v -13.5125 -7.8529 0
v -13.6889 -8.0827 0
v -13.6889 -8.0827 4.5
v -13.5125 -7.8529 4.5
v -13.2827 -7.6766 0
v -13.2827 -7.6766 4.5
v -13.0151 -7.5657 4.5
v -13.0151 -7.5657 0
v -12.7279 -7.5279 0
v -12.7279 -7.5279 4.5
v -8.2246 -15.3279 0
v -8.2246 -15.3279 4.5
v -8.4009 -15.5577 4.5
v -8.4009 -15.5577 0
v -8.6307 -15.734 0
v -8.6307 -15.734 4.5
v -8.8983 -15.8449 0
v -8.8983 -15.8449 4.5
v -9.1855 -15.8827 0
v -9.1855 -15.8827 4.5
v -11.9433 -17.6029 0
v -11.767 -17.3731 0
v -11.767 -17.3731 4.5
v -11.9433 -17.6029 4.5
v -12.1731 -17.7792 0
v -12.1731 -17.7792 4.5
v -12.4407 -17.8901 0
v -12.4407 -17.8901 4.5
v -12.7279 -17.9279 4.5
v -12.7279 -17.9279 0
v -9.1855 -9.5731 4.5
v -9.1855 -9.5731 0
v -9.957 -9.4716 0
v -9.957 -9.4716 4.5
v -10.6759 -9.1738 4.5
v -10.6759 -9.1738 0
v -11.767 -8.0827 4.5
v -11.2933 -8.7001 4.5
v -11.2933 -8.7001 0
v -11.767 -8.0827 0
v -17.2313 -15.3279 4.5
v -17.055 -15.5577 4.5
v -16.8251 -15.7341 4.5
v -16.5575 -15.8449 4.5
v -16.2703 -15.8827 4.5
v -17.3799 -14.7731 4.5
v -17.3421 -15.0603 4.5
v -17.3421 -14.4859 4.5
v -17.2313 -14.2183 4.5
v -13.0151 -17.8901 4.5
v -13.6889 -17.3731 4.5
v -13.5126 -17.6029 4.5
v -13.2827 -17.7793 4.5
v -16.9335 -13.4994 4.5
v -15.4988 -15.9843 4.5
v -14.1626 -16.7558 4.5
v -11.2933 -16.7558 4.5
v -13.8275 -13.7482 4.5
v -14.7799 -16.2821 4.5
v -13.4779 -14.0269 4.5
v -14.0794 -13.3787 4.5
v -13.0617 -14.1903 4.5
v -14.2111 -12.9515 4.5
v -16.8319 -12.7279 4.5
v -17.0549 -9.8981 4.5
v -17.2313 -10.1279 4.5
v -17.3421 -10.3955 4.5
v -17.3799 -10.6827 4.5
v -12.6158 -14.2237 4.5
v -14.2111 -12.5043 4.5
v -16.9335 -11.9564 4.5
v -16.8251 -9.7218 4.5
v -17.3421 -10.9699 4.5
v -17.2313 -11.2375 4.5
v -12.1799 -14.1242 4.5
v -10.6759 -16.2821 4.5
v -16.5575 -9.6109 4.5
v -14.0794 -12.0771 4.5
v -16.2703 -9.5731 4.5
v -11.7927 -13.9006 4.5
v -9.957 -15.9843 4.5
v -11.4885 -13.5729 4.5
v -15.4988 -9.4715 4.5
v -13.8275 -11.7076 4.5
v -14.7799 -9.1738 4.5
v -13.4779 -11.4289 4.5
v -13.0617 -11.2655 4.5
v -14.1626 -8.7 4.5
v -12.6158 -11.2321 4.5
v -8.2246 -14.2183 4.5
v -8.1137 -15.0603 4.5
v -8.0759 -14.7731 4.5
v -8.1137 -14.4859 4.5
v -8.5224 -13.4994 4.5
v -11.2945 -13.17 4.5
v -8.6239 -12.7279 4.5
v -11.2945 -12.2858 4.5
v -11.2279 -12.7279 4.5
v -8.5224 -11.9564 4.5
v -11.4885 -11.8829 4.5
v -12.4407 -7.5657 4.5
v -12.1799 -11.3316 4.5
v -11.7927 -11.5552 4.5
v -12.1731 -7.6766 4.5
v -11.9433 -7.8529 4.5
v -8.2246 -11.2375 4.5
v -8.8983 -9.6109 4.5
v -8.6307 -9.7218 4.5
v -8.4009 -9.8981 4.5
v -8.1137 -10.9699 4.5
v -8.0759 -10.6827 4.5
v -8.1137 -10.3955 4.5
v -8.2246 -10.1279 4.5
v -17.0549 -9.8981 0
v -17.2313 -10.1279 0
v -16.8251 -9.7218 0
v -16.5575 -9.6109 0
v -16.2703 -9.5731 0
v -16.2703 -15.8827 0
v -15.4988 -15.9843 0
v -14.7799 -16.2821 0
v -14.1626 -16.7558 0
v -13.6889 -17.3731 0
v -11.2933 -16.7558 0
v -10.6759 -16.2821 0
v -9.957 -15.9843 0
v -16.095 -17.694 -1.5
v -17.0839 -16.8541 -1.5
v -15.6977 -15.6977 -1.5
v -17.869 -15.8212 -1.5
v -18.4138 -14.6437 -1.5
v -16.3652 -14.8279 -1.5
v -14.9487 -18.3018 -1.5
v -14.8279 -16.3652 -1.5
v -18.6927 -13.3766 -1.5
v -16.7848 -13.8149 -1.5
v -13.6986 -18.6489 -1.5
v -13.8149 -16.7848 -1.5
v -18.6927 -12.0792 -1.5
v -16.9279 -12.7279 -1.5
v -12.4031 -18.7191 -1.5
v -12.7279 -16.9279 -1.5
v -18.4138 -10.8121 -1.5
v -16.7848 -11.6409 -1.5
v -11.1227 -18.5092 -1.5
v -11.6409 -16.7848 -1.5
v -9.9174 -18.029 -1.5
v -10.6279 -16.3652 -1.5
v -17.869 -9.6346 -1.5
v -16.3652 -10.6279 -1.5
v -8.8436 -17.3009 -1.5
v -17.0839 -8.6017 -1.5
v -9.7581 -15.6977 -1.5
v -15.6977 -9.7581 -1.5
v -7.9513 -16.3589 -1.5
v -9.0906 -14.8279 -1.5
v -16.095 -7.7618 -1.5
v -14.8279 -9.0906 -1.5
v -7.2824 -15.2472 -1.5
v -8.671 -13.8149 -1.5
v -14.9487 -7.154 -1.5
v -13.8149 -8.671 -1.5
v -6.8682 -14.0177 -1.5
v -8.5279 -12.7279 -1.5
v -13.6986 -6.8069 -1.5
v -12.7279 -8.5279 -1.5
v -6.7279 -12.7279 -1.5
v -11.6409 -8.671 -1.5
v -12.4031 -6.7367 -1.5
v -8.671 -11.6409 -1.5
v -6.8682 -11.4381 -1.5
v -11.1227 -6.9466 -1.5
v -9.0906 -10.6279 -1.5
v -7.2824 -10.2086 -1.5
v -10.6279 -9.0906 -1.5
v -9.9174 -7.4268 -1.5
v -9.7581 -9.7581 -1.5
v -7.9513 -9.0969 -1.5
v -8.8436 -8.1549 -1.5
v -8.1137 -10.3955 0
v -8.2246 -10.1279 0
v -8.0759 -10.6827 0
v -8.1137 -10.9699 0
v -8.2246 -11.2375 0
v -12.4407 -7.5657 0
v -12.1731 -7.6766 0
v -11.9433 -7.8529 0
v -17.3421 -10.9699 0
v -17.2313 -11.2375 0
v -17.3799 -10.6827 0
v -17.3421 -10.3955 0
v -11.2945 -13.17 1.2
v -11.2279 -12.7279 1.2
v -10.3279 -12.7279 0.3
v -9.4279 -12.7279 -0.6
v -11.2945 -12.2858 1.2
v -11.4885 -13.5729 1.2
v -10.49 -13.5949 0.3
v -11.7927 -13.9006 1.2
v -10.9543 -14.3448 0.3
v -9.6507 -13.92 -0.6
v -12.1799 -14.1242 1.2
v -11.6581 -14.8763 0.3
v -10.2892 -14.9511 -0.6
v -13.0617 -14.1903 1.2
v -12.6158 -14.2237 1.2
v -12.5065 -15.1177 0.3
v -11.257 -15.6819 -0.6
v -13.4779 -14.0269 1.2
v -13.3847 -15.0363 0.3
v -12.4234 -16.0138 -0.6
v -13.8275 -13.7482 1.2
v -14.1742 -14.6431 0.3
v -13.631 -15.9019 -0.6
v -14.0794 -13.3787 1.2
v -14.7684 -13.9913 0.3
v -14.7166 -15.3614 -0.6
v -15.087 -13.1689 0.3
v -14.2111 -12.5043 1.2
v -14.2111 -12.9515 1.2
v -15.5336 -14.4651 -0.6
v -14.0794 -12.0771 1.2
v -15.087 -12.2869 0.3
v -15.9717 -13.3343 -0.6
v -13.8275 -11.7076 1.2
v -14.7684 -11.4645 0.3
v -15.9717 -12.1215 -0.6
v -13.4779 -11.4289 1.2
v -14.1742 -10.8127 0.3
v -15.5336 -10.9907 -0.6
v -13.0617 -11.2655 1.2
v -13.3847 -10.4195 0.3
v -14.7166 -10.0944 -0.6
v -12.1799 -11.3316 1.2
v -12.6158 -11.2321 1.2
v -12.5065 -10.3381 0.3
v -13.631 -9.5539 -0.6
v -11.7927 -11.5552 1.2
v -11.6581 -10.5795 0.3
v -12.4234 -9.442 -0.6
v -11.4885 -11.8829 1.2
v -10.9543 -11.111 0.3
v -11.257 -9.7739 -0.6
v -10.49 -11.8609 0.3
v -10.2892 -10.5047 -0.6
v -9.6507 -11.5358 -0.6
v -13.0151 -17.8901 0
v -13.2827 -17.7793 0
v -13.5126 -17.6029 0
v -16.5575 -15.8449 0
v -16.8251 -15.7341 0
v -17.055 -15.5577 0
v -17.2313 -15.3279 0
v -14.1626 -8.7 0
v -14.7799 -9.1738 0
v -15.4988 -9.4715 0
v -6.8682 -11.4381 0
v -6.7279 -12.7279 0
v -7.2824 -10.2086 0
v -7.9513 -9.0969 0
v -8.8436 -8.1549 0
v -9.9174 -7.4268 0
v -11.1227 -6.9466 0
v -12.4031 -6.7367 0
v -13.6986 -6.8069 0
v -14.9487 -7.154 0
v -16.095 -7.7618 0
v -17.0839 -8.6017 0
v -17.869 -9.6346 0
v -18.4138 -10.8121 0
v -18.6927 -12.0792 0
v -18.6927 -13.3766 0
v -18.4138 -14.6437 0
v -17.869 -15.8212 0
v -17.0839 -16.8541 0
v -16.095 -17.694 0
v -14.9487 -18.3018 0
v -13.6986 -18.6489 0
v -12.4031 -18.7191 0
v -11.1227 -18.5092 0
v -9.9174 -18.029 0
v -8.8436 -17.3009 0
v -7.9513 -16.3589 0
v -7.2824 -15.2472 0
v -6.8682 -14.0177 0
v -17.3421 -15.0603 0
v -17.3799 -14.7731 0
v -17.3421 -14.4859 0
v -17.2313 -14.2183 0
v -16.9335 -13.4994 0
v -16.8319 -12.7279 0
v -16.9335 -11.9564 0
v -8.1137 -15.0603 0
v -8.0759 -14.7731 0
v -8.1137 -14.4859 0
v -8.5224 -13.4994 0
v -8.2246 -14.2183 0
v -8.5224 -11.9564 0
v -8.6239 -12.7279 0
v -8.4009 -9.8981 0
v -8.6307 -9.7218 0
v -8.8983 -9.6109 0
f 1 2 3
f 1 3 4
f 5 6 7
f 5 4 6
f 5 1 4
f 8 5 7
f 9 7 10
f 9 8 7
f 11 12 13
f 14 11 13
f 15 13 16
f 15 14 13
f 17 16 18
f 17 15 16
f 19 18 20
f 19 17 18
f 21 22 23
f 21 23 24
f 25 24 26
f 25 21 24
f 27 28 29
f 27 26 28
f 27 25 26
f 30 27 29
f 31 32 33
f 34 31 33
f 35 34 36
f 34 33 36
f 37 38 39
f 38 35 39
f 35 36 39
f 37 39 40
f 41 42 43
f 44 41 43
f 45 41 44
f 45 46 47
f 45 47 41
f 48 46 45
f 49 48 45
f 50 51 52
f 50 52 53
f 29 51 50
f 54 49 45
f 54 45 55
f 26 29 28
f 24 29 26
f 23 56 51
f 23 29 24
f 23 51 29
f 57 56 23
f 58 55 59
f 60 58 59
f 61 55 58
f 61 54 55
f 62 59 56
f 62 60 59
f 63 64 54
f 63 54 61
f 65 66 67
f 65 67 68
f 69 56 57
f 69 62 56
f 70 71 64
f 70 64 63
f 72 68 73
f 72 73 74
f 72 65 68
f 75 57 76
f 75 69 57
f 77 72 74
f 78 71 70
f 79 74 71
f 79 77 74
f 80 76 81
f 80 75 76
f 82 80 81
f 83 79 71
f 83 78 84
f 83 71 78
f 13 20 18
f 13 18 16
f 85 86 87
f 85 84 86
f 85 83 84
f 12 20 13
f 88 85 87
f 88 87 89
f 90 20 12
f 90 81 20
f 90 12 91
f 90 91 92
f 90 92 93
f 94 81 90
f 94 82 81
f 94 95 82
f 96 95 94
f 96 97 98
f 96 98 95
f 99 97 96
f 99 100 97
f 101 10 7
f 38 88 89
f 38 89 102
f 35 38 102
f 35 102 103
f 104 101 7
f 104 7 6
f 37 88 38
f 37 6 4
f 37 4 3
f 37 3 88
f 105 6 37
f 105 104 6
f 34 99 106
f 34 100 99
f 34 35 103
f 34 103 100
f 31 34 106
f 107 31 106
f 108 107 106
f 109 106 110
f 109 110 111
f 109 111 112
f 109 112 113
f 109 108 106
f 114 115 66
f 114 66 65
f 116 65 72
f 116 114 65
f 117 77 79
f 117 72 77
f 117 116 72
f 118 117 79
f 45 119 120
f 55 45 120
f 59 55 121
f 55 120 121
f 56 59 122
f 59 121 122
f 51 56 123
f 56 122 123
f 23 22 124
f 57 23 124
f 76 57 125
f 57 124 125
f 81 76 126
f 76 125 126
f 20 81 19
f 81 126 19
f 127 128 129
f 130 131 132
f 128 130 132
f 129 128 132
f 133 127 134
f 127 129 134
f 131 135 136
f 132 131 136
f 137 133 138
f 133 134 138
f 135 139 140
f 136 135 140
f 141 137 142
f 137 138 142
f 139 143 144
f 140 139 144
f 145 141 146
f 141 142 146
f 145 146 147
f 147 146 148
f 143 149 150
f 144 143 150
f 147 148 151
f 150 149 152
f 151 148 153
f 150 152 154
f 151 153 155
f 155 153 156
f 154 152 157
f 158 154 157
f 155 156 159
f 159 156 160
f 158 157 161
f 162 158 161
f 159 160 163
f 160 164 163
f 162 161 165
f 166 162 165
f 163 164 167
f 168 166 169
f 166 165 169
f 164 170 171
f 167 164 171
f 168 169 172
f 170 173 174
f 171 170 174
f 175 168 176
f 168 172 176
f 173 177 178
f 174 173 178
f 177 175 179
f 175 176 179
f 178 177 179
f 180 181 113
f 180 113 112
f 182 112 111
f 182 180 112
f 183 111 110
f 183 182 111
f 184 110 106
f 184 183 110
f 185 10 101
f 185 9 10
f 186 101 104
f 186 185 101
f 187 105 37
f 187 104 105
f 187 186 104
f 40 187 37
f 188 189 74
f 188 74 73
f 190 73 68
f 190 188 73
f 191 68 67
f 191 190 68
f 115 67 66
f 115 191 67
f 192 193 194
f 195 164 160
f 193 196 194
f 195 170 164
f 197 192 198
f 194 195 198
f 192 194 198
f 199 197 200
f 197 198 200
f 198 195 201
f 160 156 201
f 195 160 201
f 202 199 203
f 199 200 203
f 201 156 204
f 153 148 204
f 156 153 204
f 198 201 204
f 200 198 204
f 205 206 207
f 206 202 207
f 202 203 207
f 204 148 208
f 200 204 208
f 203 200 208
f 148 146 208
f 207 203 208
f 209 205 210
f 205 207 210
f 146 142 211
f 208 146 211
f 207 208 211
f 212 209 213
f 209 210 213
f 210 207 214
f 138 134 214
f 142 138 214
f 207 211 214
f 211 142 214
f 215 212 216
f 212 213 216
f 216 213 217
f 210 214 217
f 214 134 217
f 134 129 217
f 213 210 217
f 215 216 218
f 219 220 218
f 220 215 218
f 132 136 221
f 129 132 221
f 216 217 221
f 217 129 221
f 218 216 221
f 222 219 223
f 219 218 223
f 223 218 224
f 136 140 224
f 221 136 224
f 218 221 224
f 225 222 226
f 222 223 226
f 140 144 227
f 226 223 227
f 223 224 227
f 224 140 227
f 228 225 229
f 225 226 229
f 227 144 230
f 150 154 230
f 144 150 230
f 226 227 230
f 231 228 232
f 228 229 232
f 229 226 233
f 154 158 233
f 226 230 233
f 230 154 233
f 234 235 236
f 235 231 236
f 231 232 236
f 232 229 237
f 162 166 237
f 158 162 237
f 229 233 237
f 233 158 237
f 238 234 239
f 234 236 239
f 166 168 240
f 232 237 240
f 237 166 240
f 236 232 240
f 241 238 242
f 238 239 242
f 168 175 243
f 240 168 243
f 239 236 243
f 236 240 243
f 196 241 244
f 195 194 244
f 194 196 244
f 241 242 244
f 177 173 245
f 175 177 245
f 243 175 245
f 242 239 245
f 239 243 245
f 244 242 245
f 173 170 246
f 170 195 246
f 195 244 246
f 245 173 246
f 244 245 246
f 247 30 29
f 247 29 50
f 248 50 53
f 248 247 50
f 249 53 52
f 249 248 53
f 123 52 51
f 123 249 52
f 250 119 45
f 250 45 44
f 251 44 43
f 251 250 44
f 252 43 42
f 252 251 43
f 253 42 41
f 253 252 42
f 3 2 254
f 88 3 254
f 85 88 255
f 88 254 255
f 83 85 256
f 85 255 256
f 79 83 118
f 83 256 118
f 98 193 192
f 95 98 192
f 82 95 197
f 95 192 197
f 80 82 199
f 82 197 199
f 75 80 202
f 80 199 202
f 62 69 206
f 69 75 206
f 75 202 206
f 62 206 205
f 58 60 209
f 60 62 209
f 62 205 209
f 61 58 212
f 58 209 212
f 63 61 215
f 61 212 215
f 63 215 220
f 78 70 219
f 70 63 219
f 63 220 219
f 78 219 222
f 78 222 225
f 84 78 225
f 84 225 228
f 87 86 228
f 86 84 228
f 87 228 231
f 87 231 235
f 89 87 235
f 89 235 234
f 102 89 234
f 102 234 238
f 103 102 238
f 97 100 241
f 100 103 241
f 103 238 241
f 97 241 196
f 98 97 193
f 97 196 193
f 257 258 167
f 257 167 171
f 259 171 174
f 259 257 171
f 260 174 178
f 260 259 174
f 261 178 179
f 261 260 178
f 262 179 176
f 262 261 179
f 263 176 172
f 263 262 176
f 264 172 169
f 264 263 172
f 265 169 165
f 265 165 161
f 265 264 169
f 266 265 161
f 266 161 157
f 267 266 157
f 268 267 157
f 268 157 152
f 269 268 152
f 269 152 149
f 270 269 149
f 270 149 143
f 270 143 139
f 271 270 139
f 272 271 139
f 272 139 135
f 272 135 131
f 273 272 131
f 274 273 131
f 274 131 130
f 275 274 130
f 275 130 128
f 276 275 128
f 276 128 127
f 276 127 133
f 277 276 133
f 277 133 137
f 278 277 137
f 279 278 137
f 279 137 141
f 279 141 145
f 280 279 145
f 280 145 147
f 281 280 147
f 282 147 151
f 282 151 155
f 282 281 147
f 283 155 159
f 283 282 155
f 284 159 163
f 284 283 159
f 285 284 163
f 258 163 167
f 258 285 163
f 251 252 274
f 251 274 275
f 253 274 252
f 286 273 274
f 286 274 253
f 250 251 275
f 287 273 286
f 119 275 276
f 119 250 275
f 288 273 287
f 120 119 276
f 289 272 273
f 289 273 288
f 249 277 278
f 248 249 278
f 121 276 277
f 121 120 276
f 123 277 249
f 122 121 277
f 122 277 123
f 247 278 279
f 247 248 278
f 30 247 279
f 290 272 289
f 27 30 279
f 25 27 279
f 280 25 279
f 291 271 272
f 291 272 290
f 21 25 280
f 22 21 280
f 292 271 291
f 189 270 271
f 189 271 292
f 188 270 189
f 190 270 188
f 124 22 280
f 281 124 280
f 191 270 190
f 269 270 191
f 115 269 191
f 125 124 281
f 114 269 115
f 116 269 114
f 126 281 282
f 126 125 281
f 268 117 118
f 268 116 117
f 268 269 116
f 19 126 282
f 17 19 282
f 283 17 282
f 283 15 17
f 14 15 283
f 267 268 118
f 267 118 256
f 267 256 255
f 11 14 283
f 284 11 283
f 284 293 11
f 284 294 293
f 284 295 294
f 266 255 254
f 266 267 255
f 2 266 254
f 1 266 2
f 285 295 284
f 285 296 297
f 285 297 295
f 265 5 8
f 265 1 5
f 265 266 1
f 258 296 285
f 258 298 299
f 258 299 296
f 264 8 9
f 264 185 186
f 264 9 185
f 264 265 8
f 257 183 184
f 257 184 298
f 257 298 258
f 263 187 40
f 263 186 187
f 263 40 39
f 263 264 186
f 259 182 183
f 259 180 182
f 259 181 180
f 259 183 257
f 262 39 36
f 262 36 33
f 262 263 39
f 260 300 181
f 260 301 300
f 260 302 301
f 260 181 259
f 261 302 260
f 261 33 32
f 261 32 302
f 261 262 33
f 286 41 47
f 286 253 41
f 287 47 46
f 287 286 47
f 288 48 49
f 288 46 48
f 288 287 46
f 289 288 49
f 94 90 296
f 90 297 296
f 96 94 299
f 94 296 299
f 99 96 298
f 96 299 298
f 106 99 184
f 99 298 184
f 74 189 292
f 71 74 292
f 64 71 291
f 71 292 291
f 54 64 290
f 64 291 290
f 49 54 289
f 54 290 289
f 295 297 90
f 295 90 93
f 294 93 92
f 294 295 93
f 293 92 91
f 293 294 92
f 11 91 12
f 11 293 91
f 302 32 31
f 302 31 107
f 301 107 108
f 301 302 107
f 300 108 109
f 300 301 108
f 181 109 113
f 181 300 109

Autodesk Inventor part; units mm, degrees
ref_plane "YZ Plane" through (0, 0, 0) normal (1, 0, 0) x (0, 1, 0)
ref_plane "XZ Plane" through (0, 0, 0) normal (0, 1, 0) x (-1, 0, 0)
ref_plane "XY Plane" through (0, 0, 0) normal (0, 0, 1) x (1, 0, 0)
sketch "スケッチ1" plane through (0, 0, 0) normal (0, 0, 1) x (1, 0, 0)
  arc A0 (-16.2703, -9.5731) -> (-13.6889, -8.0827) centre (-16.2703, -6.5923) ccw
  arc A1 (-16.2703, -9.5731) -> (-17.2313, -10.1279) centre (-16.2703, -10.6827) ccw
  arc A2 (-17.2313, -10.1279) -> (-17.2313, -11.2375) centre (-16.2703, -10.6827) ccw
  arc A3 (-17.2313, -14.2183) -> (-17.2313, -11.2375) centre (-19.8127, -12.7279) ccw
  arc A4 (-17.2313, -14.2183) -> (-17.2313, -15.3279) centre (-16.2703, -14.7731) ccw
  arc A5 (-17.2313, -15.3279) -> (-16.2703, -15.8827) centre (-16.2703, -14.7731) ccw
  arc A6 (-13.6889, -17.3731) -> (-16.2703, -15.8827) centre (-16.2703, -18.8635) ccw
  arc A7 (-13.6889, -17.3731) -> (-12.7279, -17.9279) centre (-12.7279, -16.8183) ccw
  arc A8 (-12.7279, -17.9279) -> (-11.767, -17.3731) centre (-12.7279, -16.8183) ccw
  arc A9 (-9.1855, -15.8827) -> (-11.767, -17.3731) centre (-9.1855, -18.8635) ccw
  arc A10 (-9.1855, -15.8827) -> (-8.2246, -15.3279) centre (-9.1855, -14.7731) ccw
  arc A11 (-8.2246, -15.3279) -> (-8.2246, -14.2183) centre (-9.1855, -14.7731) ccw
  arc A12 (-8.2246, -11.2375) -> (-8.2246, -14.2183) centre (-5.6431, -12.7279) ccw
  arc A13 (-8.2246, -11.2375) -> (-8.2246, -10.1279) centre (-9.1855, -10.6827) ccw
  arc A14 (-8.2246, -10.1279) -> (-9.1855, -9.5731) centre (-9.1855, -10.6827) ccw
  arc A15 (-11.767, -8.0827) -> (-9.1855, -9.5731) centre (-9.1855, -6.5923) ccw
  arc A16 (-11.767, -8.0827) -> (-12.7279, -7.5279) centre (-12.7279, -8.6375) ccw
  arc A17 (-12.7279, -7.5279) -> (-13.6889, -8.0827) centre (-12.7279, -8.6375) ccw
  circle A18 centre (-12.7279, -12.7279) radius 1.5 construction
  circle A19 centre (-12.7279, -12.7279) radius 1.5
  circle A20 centre (-12.7279, -12.7279) radius 6
  point P0 (0, 0)
  point P1 (0, 0)
  dimension "d0" = 3
extrude "押し出し1" add sketch "スケッチ1" against normal blind 1.5 contours A0 A17 A16 A15 A14 A13 A12 A11 A10 A9 A8 A7 A6 A5 A4 A3 A2 A1 | A20
extrude "押し出し2" add sketch "スケッチ1" along normal blind 4.5 contours A0 A17 A16 A15 A14 A13 A12 A11 A10 A9 A8 A7 A6 A5 A4 A3 A2 A1
chamfer "面取り1" distance 2.7 angle 45 1 edges at (-14.2279, -12.7279, -1.5)
properties part number "原動節接続部v2内-1" material "アルミニウム 2014-T4"
